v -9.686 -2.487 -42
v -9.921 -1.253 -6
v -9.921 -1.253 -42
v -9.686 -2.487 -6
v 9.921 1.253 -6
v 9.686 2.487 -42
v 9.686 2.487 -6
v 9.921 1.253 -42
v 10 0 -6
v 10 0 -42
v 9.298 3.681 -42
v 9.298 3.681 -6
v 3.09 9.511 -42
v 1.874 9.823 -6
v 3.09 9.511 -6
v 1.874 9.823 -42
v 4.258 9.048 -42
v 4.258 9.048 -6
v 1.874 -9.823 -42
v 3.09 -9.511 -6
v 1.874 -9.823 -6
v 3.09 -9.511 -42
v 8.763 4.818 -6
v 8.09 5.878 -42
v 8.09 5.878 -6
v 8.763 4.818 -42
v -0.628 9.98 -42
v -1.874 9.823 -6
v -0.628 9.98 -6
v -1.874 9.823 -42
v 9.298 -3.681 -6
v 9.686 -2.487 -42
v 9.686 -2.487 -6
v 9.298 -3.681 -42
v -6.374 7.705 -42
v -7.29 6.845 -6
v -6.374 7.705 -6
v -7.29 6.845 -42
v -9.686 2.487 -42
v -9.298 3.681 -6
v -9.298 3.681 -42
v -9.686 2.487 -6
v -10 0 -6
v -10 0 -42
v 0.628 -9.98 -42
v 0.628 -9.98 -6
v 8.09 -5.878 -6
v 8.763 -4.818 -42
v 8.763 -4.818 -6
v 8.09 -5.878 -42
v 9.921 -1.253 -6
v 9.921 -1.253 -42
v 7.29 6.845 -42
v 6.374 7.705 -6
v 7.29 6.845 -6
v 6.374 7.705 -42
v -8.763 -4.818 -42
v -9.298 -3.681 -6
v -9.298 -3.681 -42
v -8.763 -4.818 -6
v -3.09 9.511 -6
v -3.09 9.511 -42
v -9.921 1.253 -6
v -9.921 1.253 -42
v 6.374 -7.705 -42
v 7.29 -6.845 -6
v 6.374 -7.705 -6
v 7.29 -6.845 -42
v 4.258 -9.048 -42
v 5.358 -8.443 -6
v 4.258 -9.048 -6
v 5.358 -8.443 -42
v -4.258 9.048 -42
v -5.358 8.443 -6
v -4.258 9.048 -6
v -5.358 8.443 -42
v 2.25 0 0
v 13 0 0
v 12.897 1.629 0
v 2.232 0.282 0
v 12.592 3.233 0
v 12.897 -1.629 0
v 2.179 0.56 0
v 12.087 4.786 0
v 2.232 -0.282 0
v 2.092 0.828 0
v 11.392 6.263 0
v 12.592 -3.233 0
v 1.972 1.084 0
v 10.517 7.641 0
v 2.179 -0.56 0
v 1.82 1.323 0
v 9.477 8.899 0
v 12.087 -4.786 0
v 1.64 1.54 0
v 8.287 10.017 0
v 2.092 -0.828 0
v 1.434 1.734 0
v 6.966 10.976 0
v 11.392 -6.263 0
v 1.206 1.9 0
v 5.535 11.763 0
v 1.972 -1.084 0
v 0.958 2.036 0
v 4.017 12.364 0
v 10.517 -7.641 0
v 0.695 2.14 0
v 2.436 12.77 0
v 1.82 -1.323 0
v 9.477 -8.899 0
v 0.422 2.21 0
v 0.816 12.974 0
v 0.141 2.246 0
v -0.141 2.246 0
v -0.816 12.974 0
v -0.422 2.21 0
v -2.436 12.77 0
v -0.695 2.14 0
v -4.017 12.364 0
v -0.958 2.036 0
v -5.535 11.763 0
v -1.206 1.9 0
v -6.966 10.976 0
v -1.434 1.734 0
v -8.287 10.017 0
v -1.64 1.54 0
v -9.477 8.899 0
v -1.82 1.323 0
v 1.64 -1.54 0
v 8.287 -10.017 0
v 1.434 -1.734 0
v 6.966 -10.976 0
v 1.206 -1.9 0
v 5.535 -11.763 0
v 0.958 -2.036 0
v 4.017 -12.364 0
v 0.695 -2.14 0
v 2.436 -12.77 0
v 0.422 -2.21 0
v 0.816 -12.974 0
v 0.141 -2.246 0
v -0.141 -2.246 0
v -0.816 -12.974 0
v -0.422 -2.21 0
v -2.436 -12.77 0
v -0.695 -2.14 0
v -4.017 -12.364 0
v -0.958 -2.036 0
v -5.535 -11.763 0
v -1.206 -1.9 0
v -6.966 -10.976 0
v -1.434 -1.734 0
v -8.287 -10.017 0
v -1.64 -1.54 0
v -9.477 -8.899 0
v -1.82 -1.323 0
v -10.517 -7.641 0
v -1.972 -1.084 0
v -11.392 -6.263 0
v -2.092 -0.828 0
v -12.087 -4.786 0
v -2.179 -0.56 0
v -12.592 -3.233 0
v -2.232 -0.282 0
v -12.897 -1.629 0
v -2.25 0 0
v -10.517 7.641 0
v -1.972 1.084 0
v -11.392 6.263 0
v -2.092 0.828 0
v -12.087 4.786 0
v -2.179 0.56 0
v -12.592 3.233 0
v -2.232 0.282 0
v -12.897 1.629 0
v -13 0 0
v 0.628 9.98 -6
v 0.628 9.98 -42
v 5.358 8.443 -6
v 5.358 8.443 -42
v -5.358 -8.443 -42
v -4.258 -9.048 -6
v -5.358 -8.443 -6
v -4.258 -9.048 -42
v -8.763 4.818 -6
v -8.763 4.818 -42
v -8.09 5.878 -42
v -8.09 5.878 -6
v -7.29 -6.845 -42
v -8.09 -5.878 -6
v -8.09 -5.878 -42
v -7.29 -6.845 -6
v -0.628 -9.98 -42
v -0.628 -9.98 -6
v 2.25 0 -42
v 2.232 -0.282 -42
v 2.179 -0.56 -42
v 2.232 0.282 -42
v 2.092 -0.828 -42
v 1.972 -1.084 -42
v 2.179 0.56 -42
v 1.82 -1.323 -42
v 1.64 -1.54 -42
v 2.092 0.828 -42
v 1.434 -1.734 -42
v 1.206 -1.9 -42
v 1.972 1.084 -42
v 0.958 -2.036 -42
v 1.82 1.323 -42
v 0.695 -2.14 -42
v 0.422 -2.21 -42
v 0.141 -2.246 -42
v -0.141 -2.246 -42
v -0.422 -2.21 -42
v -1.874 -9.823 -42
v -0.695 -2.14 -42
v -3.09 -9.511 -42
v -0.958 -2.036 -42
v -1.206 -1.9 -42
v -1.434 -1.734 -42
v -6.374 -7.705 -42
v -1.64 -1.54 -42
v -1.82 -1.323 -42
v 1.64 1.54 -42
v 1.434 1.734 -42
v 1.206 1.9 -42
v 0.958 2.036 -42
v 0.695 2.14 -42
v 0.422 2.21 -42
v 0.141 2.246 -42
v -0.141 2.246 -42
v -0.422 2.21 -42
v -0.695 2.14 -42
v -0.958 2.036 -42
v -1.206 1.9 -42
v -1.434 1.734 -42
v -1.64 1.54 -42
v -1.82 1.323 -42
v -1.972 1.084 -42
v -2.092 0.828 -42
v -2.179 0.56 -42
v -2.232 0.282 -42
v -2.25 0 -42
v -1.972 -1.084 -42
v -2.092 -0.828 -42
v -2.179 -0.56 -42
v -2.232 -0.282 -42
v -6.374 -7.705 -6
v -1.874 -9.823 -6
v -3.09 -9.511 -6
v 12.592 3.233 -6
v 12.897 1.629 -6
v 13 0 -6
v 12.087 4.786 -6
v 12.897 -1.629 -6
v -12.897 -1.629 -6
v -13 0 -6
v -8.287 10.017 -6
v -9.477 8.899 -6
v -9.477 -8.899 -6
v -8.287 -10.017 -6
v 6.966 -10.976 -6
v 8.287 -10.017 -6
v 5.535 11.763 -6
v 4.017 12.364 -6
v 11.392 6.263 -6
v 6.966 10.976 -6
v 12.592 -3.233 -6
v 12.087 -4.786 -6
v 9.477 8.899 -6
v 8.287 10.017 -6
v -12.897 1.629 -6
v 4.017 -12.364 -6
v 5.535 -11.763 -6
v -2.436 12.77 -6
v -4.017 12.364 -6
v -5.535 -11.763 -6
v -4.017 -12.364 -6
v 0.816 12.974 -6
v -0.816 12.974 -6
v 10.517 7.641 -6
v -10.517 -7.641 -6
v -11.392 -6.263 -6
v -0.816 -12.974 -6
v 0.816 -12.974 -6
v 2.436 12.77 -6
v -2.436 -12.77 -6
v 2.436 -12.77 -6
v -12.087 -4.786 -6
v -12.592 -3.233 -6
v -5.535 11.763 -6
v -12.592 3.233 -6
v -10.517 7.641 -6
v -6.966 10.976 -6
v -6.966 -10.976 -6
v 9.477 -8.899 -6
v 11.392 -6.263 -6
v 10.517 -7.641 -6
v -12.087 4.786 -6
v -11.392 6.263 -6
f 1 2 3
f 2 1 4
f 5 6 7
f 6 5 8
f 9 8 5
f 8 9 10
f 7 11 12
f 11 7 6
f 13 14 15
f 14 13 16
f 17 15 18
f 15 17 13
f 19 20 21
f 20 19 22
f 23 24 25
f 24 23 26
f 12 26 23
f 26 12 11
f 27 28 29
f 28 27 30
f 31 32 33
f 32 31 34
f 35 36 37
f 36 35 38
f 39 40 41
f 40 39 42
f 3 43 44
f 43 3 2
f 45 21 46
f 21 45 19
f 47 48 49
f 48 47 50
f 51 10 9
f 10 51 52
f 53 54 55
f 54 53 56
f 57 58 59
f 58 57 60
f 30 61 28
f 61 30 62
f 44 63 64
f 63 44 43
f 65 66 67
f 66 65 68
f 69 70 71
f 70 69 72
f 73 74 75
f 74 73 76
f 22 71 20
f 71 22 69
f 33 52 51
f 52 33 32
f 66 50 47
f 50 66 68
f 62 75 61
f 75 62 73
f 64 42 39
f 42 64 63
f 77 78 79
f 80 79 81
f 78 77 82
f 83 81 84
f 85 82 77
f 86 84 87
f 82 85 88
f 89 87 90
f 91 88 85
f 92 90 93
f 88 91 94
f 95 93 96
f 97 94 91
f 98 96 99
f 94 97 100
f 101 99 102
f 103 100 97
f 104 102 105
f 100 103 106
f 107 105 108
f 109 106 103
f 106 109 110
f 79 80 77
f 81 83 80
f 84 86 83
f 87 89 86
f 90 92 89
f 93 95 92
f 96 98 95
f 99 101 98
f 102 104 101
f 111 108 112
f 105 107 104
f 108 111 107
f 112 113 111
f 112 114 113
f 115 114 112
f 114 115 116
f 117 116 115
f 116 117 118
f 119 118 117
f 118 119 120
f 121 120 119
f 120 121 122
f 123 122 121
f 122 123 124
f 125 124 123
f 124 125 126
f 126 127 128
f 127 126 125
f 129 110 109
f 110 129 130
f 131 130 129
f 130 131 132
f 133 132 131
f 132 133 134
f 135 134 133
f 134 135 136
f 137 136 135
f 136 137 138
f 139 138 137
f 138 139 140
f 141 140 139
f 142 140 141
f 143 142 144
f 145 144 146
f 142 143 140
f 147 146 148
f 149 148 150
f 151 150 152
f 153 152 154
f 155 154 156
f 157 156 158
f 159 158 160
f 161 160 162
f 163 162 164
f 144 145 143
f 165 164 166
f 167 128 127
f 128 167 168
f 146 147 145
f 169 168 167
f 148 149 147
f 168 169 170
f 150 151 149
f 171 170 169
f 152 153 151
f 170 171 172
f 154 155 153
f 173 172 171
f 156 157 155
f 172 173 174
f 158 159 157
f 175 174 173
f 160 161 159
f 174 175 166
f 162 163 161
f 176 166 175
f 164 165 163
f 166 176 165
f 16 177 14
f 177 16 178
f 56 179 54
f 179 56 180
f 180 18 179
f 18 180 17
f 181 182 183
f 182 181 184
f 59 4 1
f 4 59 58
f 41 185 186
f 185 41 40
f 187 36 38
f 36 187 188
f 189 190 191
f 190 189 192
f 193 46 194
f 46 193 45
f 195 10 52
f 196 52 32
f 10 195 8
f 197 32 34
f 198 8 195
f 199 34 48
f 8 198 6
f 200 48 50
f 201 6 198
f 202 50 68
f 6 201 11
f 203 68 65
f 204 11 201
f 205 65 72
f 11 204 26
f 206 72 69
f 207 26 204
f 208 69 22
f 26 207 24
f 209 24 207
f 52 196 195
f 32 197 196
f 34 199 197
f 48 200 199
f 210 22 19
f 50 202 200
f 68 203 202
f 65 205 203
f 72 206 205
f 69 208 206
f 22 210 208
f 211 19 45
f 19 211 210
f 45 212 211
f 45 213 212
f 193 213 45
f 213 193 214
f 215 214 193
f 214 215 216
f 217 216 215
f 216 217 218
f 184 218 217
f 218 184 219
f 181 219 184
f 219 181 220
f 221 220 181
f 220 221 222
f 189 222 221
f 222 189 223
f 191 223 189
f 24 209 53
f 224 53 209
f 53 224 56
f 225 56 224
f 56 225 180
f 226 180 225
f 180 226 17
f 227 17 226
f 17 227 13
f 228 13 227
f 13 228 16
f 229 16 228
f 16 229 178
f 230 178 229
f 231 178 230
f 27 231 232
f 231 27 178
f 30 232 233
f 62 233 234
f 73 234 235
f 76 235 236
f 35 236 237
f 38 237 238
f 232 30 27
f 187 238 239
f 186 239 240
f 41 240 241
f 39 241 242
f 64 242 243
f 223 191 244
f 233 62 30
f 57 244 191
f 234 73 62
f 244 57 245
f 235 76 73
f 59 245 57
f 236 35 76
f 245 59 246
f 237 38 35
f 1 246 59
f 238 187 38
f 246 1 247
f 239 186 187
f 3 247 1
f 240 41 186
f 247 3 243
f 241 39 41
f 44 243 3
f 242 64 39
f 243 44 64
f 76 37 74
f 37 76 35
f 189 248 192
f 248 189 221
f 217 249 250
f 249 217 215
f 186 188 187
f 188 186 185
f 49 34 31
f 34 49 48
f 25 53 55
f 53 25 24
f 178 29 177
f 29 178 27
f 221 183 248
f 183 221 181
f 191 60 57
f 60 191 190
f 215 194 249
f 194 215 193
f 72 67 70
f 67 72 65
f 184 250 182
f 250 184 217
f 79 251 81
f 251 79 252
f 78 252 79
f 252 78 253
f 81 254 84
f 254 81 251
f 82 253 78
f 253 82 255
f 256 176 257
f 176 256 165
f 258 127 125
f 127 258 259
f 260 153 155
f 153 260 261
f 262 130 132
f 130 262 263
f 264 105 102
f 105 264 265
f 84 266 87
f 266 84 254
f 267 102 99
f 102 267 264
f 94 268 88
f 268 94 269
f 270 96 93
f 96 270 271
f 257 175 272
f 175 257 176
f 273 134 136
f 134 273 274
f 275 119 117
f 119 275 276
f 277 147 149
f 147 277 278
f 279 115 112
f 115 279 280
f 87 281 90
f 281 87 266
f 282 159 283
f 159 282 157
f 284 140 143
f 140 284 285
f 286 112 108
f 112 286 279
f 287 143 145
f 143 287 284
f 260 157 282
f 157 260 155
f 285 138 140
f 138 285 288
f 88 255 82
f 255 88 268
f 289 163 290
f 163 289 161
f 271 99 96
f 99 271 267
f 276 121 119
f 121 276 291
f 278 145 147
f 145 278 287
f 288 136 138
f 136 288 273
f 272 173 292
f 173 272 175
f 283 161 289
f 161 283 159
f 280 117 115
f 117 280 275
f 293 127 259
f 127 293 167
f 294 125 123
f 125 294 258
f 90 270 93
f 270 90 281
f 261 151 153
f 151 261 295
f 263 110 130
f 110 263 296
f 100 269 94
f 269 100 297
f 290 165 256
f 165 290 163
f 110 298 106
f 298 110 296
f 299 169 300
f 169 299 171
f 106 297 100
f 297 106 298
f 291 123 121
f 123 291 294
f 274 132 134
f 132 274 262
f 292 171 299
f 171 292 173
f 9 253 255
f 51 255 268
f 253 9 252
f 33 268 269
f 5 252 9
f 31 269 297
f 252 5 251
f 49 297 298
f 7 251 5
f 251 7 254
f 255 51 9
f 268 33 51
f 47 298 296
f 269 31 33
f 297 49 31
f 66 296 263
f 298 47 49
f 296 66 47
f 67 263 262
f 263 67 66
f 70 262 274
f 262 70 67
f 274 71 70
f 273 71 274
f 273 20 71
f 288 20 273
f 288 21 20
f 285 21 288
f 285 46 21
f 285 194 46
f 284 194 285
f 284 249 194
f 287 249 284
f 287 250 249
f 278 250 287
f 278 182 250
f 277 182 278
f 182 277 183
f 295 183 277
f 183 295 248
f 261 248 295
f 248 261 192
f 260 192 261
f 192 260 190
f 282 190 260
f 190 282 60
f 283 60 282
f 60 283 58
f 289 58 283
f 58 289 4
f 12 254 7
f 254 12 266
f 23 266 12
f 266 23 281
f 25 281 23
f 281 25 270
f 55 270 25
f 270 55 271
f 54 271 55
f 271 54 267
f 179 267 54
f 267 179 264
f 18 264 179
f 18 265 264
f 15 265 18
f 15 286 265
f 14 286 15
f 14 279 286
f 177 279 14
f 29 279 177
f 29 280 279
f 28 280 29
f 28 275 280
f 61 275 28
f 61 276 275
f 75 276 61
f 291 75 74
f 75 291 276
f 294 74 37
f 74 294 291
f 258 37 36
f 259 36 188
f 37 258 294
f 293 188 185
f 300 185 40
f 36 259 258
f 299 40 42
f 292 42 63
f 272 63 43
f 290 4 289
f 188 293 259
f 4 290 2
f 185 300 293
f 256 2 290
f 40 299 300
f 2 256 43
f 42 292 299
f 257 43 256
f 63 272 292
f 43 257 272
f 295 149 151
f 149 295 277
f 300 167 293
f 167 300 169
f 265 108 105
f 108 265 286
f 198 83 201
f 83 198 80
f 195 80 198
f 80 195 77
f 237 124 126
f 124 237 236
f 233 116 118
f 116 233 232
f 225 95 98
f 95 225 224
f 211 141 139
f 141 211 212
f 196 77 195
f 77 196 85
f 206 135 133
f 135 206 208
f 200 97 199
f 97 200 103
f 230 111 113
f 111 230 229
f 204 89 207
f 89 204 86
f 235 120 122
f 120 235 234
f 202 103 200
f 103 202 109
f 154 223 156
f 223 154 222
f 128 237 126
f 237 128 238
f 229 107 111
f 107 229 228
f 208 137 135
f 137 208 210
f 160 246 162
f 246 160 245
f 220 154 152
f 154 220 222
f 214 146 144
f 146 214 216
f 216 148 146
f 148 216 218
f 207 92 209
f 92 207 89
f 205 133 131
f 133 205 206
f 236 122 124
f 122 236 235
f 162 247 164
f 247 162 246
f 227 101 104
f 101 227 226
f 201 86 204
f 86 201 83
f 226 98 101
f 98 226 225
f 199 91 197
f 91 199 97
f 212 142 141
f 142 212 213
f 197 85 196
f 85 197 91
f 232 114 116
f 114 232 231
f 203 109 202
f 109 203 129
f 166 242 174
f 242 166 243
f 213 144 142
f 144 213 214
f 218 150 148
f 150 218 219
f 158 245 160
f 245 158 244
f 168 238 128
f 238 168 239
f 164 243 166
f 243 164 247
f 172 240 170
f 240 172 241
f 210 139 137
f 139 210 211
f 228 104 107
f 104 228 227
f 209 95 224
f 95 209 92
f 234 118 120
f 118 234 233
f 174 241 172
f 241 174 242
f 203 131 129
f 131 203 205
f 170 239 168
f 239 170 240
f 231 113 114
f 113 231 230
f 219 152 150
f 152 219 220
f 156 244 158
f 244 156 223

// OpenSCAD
$fn = 50;


difference() {
	union() {
		translate(v = [0, 0, -42.0000000000]) {
			cylinder(h = 42, r = 10.0000000000);
		}
		translate(v = [0, 0, -6.0000000000]) {
			cylinder(h = 6, r = 13.0000000000);
		}
	}
	union() {
		#translate(v = [0, 0, -42]) {
			cylinder(h = 42, r = 2.2500000000);
		}
	}
}
